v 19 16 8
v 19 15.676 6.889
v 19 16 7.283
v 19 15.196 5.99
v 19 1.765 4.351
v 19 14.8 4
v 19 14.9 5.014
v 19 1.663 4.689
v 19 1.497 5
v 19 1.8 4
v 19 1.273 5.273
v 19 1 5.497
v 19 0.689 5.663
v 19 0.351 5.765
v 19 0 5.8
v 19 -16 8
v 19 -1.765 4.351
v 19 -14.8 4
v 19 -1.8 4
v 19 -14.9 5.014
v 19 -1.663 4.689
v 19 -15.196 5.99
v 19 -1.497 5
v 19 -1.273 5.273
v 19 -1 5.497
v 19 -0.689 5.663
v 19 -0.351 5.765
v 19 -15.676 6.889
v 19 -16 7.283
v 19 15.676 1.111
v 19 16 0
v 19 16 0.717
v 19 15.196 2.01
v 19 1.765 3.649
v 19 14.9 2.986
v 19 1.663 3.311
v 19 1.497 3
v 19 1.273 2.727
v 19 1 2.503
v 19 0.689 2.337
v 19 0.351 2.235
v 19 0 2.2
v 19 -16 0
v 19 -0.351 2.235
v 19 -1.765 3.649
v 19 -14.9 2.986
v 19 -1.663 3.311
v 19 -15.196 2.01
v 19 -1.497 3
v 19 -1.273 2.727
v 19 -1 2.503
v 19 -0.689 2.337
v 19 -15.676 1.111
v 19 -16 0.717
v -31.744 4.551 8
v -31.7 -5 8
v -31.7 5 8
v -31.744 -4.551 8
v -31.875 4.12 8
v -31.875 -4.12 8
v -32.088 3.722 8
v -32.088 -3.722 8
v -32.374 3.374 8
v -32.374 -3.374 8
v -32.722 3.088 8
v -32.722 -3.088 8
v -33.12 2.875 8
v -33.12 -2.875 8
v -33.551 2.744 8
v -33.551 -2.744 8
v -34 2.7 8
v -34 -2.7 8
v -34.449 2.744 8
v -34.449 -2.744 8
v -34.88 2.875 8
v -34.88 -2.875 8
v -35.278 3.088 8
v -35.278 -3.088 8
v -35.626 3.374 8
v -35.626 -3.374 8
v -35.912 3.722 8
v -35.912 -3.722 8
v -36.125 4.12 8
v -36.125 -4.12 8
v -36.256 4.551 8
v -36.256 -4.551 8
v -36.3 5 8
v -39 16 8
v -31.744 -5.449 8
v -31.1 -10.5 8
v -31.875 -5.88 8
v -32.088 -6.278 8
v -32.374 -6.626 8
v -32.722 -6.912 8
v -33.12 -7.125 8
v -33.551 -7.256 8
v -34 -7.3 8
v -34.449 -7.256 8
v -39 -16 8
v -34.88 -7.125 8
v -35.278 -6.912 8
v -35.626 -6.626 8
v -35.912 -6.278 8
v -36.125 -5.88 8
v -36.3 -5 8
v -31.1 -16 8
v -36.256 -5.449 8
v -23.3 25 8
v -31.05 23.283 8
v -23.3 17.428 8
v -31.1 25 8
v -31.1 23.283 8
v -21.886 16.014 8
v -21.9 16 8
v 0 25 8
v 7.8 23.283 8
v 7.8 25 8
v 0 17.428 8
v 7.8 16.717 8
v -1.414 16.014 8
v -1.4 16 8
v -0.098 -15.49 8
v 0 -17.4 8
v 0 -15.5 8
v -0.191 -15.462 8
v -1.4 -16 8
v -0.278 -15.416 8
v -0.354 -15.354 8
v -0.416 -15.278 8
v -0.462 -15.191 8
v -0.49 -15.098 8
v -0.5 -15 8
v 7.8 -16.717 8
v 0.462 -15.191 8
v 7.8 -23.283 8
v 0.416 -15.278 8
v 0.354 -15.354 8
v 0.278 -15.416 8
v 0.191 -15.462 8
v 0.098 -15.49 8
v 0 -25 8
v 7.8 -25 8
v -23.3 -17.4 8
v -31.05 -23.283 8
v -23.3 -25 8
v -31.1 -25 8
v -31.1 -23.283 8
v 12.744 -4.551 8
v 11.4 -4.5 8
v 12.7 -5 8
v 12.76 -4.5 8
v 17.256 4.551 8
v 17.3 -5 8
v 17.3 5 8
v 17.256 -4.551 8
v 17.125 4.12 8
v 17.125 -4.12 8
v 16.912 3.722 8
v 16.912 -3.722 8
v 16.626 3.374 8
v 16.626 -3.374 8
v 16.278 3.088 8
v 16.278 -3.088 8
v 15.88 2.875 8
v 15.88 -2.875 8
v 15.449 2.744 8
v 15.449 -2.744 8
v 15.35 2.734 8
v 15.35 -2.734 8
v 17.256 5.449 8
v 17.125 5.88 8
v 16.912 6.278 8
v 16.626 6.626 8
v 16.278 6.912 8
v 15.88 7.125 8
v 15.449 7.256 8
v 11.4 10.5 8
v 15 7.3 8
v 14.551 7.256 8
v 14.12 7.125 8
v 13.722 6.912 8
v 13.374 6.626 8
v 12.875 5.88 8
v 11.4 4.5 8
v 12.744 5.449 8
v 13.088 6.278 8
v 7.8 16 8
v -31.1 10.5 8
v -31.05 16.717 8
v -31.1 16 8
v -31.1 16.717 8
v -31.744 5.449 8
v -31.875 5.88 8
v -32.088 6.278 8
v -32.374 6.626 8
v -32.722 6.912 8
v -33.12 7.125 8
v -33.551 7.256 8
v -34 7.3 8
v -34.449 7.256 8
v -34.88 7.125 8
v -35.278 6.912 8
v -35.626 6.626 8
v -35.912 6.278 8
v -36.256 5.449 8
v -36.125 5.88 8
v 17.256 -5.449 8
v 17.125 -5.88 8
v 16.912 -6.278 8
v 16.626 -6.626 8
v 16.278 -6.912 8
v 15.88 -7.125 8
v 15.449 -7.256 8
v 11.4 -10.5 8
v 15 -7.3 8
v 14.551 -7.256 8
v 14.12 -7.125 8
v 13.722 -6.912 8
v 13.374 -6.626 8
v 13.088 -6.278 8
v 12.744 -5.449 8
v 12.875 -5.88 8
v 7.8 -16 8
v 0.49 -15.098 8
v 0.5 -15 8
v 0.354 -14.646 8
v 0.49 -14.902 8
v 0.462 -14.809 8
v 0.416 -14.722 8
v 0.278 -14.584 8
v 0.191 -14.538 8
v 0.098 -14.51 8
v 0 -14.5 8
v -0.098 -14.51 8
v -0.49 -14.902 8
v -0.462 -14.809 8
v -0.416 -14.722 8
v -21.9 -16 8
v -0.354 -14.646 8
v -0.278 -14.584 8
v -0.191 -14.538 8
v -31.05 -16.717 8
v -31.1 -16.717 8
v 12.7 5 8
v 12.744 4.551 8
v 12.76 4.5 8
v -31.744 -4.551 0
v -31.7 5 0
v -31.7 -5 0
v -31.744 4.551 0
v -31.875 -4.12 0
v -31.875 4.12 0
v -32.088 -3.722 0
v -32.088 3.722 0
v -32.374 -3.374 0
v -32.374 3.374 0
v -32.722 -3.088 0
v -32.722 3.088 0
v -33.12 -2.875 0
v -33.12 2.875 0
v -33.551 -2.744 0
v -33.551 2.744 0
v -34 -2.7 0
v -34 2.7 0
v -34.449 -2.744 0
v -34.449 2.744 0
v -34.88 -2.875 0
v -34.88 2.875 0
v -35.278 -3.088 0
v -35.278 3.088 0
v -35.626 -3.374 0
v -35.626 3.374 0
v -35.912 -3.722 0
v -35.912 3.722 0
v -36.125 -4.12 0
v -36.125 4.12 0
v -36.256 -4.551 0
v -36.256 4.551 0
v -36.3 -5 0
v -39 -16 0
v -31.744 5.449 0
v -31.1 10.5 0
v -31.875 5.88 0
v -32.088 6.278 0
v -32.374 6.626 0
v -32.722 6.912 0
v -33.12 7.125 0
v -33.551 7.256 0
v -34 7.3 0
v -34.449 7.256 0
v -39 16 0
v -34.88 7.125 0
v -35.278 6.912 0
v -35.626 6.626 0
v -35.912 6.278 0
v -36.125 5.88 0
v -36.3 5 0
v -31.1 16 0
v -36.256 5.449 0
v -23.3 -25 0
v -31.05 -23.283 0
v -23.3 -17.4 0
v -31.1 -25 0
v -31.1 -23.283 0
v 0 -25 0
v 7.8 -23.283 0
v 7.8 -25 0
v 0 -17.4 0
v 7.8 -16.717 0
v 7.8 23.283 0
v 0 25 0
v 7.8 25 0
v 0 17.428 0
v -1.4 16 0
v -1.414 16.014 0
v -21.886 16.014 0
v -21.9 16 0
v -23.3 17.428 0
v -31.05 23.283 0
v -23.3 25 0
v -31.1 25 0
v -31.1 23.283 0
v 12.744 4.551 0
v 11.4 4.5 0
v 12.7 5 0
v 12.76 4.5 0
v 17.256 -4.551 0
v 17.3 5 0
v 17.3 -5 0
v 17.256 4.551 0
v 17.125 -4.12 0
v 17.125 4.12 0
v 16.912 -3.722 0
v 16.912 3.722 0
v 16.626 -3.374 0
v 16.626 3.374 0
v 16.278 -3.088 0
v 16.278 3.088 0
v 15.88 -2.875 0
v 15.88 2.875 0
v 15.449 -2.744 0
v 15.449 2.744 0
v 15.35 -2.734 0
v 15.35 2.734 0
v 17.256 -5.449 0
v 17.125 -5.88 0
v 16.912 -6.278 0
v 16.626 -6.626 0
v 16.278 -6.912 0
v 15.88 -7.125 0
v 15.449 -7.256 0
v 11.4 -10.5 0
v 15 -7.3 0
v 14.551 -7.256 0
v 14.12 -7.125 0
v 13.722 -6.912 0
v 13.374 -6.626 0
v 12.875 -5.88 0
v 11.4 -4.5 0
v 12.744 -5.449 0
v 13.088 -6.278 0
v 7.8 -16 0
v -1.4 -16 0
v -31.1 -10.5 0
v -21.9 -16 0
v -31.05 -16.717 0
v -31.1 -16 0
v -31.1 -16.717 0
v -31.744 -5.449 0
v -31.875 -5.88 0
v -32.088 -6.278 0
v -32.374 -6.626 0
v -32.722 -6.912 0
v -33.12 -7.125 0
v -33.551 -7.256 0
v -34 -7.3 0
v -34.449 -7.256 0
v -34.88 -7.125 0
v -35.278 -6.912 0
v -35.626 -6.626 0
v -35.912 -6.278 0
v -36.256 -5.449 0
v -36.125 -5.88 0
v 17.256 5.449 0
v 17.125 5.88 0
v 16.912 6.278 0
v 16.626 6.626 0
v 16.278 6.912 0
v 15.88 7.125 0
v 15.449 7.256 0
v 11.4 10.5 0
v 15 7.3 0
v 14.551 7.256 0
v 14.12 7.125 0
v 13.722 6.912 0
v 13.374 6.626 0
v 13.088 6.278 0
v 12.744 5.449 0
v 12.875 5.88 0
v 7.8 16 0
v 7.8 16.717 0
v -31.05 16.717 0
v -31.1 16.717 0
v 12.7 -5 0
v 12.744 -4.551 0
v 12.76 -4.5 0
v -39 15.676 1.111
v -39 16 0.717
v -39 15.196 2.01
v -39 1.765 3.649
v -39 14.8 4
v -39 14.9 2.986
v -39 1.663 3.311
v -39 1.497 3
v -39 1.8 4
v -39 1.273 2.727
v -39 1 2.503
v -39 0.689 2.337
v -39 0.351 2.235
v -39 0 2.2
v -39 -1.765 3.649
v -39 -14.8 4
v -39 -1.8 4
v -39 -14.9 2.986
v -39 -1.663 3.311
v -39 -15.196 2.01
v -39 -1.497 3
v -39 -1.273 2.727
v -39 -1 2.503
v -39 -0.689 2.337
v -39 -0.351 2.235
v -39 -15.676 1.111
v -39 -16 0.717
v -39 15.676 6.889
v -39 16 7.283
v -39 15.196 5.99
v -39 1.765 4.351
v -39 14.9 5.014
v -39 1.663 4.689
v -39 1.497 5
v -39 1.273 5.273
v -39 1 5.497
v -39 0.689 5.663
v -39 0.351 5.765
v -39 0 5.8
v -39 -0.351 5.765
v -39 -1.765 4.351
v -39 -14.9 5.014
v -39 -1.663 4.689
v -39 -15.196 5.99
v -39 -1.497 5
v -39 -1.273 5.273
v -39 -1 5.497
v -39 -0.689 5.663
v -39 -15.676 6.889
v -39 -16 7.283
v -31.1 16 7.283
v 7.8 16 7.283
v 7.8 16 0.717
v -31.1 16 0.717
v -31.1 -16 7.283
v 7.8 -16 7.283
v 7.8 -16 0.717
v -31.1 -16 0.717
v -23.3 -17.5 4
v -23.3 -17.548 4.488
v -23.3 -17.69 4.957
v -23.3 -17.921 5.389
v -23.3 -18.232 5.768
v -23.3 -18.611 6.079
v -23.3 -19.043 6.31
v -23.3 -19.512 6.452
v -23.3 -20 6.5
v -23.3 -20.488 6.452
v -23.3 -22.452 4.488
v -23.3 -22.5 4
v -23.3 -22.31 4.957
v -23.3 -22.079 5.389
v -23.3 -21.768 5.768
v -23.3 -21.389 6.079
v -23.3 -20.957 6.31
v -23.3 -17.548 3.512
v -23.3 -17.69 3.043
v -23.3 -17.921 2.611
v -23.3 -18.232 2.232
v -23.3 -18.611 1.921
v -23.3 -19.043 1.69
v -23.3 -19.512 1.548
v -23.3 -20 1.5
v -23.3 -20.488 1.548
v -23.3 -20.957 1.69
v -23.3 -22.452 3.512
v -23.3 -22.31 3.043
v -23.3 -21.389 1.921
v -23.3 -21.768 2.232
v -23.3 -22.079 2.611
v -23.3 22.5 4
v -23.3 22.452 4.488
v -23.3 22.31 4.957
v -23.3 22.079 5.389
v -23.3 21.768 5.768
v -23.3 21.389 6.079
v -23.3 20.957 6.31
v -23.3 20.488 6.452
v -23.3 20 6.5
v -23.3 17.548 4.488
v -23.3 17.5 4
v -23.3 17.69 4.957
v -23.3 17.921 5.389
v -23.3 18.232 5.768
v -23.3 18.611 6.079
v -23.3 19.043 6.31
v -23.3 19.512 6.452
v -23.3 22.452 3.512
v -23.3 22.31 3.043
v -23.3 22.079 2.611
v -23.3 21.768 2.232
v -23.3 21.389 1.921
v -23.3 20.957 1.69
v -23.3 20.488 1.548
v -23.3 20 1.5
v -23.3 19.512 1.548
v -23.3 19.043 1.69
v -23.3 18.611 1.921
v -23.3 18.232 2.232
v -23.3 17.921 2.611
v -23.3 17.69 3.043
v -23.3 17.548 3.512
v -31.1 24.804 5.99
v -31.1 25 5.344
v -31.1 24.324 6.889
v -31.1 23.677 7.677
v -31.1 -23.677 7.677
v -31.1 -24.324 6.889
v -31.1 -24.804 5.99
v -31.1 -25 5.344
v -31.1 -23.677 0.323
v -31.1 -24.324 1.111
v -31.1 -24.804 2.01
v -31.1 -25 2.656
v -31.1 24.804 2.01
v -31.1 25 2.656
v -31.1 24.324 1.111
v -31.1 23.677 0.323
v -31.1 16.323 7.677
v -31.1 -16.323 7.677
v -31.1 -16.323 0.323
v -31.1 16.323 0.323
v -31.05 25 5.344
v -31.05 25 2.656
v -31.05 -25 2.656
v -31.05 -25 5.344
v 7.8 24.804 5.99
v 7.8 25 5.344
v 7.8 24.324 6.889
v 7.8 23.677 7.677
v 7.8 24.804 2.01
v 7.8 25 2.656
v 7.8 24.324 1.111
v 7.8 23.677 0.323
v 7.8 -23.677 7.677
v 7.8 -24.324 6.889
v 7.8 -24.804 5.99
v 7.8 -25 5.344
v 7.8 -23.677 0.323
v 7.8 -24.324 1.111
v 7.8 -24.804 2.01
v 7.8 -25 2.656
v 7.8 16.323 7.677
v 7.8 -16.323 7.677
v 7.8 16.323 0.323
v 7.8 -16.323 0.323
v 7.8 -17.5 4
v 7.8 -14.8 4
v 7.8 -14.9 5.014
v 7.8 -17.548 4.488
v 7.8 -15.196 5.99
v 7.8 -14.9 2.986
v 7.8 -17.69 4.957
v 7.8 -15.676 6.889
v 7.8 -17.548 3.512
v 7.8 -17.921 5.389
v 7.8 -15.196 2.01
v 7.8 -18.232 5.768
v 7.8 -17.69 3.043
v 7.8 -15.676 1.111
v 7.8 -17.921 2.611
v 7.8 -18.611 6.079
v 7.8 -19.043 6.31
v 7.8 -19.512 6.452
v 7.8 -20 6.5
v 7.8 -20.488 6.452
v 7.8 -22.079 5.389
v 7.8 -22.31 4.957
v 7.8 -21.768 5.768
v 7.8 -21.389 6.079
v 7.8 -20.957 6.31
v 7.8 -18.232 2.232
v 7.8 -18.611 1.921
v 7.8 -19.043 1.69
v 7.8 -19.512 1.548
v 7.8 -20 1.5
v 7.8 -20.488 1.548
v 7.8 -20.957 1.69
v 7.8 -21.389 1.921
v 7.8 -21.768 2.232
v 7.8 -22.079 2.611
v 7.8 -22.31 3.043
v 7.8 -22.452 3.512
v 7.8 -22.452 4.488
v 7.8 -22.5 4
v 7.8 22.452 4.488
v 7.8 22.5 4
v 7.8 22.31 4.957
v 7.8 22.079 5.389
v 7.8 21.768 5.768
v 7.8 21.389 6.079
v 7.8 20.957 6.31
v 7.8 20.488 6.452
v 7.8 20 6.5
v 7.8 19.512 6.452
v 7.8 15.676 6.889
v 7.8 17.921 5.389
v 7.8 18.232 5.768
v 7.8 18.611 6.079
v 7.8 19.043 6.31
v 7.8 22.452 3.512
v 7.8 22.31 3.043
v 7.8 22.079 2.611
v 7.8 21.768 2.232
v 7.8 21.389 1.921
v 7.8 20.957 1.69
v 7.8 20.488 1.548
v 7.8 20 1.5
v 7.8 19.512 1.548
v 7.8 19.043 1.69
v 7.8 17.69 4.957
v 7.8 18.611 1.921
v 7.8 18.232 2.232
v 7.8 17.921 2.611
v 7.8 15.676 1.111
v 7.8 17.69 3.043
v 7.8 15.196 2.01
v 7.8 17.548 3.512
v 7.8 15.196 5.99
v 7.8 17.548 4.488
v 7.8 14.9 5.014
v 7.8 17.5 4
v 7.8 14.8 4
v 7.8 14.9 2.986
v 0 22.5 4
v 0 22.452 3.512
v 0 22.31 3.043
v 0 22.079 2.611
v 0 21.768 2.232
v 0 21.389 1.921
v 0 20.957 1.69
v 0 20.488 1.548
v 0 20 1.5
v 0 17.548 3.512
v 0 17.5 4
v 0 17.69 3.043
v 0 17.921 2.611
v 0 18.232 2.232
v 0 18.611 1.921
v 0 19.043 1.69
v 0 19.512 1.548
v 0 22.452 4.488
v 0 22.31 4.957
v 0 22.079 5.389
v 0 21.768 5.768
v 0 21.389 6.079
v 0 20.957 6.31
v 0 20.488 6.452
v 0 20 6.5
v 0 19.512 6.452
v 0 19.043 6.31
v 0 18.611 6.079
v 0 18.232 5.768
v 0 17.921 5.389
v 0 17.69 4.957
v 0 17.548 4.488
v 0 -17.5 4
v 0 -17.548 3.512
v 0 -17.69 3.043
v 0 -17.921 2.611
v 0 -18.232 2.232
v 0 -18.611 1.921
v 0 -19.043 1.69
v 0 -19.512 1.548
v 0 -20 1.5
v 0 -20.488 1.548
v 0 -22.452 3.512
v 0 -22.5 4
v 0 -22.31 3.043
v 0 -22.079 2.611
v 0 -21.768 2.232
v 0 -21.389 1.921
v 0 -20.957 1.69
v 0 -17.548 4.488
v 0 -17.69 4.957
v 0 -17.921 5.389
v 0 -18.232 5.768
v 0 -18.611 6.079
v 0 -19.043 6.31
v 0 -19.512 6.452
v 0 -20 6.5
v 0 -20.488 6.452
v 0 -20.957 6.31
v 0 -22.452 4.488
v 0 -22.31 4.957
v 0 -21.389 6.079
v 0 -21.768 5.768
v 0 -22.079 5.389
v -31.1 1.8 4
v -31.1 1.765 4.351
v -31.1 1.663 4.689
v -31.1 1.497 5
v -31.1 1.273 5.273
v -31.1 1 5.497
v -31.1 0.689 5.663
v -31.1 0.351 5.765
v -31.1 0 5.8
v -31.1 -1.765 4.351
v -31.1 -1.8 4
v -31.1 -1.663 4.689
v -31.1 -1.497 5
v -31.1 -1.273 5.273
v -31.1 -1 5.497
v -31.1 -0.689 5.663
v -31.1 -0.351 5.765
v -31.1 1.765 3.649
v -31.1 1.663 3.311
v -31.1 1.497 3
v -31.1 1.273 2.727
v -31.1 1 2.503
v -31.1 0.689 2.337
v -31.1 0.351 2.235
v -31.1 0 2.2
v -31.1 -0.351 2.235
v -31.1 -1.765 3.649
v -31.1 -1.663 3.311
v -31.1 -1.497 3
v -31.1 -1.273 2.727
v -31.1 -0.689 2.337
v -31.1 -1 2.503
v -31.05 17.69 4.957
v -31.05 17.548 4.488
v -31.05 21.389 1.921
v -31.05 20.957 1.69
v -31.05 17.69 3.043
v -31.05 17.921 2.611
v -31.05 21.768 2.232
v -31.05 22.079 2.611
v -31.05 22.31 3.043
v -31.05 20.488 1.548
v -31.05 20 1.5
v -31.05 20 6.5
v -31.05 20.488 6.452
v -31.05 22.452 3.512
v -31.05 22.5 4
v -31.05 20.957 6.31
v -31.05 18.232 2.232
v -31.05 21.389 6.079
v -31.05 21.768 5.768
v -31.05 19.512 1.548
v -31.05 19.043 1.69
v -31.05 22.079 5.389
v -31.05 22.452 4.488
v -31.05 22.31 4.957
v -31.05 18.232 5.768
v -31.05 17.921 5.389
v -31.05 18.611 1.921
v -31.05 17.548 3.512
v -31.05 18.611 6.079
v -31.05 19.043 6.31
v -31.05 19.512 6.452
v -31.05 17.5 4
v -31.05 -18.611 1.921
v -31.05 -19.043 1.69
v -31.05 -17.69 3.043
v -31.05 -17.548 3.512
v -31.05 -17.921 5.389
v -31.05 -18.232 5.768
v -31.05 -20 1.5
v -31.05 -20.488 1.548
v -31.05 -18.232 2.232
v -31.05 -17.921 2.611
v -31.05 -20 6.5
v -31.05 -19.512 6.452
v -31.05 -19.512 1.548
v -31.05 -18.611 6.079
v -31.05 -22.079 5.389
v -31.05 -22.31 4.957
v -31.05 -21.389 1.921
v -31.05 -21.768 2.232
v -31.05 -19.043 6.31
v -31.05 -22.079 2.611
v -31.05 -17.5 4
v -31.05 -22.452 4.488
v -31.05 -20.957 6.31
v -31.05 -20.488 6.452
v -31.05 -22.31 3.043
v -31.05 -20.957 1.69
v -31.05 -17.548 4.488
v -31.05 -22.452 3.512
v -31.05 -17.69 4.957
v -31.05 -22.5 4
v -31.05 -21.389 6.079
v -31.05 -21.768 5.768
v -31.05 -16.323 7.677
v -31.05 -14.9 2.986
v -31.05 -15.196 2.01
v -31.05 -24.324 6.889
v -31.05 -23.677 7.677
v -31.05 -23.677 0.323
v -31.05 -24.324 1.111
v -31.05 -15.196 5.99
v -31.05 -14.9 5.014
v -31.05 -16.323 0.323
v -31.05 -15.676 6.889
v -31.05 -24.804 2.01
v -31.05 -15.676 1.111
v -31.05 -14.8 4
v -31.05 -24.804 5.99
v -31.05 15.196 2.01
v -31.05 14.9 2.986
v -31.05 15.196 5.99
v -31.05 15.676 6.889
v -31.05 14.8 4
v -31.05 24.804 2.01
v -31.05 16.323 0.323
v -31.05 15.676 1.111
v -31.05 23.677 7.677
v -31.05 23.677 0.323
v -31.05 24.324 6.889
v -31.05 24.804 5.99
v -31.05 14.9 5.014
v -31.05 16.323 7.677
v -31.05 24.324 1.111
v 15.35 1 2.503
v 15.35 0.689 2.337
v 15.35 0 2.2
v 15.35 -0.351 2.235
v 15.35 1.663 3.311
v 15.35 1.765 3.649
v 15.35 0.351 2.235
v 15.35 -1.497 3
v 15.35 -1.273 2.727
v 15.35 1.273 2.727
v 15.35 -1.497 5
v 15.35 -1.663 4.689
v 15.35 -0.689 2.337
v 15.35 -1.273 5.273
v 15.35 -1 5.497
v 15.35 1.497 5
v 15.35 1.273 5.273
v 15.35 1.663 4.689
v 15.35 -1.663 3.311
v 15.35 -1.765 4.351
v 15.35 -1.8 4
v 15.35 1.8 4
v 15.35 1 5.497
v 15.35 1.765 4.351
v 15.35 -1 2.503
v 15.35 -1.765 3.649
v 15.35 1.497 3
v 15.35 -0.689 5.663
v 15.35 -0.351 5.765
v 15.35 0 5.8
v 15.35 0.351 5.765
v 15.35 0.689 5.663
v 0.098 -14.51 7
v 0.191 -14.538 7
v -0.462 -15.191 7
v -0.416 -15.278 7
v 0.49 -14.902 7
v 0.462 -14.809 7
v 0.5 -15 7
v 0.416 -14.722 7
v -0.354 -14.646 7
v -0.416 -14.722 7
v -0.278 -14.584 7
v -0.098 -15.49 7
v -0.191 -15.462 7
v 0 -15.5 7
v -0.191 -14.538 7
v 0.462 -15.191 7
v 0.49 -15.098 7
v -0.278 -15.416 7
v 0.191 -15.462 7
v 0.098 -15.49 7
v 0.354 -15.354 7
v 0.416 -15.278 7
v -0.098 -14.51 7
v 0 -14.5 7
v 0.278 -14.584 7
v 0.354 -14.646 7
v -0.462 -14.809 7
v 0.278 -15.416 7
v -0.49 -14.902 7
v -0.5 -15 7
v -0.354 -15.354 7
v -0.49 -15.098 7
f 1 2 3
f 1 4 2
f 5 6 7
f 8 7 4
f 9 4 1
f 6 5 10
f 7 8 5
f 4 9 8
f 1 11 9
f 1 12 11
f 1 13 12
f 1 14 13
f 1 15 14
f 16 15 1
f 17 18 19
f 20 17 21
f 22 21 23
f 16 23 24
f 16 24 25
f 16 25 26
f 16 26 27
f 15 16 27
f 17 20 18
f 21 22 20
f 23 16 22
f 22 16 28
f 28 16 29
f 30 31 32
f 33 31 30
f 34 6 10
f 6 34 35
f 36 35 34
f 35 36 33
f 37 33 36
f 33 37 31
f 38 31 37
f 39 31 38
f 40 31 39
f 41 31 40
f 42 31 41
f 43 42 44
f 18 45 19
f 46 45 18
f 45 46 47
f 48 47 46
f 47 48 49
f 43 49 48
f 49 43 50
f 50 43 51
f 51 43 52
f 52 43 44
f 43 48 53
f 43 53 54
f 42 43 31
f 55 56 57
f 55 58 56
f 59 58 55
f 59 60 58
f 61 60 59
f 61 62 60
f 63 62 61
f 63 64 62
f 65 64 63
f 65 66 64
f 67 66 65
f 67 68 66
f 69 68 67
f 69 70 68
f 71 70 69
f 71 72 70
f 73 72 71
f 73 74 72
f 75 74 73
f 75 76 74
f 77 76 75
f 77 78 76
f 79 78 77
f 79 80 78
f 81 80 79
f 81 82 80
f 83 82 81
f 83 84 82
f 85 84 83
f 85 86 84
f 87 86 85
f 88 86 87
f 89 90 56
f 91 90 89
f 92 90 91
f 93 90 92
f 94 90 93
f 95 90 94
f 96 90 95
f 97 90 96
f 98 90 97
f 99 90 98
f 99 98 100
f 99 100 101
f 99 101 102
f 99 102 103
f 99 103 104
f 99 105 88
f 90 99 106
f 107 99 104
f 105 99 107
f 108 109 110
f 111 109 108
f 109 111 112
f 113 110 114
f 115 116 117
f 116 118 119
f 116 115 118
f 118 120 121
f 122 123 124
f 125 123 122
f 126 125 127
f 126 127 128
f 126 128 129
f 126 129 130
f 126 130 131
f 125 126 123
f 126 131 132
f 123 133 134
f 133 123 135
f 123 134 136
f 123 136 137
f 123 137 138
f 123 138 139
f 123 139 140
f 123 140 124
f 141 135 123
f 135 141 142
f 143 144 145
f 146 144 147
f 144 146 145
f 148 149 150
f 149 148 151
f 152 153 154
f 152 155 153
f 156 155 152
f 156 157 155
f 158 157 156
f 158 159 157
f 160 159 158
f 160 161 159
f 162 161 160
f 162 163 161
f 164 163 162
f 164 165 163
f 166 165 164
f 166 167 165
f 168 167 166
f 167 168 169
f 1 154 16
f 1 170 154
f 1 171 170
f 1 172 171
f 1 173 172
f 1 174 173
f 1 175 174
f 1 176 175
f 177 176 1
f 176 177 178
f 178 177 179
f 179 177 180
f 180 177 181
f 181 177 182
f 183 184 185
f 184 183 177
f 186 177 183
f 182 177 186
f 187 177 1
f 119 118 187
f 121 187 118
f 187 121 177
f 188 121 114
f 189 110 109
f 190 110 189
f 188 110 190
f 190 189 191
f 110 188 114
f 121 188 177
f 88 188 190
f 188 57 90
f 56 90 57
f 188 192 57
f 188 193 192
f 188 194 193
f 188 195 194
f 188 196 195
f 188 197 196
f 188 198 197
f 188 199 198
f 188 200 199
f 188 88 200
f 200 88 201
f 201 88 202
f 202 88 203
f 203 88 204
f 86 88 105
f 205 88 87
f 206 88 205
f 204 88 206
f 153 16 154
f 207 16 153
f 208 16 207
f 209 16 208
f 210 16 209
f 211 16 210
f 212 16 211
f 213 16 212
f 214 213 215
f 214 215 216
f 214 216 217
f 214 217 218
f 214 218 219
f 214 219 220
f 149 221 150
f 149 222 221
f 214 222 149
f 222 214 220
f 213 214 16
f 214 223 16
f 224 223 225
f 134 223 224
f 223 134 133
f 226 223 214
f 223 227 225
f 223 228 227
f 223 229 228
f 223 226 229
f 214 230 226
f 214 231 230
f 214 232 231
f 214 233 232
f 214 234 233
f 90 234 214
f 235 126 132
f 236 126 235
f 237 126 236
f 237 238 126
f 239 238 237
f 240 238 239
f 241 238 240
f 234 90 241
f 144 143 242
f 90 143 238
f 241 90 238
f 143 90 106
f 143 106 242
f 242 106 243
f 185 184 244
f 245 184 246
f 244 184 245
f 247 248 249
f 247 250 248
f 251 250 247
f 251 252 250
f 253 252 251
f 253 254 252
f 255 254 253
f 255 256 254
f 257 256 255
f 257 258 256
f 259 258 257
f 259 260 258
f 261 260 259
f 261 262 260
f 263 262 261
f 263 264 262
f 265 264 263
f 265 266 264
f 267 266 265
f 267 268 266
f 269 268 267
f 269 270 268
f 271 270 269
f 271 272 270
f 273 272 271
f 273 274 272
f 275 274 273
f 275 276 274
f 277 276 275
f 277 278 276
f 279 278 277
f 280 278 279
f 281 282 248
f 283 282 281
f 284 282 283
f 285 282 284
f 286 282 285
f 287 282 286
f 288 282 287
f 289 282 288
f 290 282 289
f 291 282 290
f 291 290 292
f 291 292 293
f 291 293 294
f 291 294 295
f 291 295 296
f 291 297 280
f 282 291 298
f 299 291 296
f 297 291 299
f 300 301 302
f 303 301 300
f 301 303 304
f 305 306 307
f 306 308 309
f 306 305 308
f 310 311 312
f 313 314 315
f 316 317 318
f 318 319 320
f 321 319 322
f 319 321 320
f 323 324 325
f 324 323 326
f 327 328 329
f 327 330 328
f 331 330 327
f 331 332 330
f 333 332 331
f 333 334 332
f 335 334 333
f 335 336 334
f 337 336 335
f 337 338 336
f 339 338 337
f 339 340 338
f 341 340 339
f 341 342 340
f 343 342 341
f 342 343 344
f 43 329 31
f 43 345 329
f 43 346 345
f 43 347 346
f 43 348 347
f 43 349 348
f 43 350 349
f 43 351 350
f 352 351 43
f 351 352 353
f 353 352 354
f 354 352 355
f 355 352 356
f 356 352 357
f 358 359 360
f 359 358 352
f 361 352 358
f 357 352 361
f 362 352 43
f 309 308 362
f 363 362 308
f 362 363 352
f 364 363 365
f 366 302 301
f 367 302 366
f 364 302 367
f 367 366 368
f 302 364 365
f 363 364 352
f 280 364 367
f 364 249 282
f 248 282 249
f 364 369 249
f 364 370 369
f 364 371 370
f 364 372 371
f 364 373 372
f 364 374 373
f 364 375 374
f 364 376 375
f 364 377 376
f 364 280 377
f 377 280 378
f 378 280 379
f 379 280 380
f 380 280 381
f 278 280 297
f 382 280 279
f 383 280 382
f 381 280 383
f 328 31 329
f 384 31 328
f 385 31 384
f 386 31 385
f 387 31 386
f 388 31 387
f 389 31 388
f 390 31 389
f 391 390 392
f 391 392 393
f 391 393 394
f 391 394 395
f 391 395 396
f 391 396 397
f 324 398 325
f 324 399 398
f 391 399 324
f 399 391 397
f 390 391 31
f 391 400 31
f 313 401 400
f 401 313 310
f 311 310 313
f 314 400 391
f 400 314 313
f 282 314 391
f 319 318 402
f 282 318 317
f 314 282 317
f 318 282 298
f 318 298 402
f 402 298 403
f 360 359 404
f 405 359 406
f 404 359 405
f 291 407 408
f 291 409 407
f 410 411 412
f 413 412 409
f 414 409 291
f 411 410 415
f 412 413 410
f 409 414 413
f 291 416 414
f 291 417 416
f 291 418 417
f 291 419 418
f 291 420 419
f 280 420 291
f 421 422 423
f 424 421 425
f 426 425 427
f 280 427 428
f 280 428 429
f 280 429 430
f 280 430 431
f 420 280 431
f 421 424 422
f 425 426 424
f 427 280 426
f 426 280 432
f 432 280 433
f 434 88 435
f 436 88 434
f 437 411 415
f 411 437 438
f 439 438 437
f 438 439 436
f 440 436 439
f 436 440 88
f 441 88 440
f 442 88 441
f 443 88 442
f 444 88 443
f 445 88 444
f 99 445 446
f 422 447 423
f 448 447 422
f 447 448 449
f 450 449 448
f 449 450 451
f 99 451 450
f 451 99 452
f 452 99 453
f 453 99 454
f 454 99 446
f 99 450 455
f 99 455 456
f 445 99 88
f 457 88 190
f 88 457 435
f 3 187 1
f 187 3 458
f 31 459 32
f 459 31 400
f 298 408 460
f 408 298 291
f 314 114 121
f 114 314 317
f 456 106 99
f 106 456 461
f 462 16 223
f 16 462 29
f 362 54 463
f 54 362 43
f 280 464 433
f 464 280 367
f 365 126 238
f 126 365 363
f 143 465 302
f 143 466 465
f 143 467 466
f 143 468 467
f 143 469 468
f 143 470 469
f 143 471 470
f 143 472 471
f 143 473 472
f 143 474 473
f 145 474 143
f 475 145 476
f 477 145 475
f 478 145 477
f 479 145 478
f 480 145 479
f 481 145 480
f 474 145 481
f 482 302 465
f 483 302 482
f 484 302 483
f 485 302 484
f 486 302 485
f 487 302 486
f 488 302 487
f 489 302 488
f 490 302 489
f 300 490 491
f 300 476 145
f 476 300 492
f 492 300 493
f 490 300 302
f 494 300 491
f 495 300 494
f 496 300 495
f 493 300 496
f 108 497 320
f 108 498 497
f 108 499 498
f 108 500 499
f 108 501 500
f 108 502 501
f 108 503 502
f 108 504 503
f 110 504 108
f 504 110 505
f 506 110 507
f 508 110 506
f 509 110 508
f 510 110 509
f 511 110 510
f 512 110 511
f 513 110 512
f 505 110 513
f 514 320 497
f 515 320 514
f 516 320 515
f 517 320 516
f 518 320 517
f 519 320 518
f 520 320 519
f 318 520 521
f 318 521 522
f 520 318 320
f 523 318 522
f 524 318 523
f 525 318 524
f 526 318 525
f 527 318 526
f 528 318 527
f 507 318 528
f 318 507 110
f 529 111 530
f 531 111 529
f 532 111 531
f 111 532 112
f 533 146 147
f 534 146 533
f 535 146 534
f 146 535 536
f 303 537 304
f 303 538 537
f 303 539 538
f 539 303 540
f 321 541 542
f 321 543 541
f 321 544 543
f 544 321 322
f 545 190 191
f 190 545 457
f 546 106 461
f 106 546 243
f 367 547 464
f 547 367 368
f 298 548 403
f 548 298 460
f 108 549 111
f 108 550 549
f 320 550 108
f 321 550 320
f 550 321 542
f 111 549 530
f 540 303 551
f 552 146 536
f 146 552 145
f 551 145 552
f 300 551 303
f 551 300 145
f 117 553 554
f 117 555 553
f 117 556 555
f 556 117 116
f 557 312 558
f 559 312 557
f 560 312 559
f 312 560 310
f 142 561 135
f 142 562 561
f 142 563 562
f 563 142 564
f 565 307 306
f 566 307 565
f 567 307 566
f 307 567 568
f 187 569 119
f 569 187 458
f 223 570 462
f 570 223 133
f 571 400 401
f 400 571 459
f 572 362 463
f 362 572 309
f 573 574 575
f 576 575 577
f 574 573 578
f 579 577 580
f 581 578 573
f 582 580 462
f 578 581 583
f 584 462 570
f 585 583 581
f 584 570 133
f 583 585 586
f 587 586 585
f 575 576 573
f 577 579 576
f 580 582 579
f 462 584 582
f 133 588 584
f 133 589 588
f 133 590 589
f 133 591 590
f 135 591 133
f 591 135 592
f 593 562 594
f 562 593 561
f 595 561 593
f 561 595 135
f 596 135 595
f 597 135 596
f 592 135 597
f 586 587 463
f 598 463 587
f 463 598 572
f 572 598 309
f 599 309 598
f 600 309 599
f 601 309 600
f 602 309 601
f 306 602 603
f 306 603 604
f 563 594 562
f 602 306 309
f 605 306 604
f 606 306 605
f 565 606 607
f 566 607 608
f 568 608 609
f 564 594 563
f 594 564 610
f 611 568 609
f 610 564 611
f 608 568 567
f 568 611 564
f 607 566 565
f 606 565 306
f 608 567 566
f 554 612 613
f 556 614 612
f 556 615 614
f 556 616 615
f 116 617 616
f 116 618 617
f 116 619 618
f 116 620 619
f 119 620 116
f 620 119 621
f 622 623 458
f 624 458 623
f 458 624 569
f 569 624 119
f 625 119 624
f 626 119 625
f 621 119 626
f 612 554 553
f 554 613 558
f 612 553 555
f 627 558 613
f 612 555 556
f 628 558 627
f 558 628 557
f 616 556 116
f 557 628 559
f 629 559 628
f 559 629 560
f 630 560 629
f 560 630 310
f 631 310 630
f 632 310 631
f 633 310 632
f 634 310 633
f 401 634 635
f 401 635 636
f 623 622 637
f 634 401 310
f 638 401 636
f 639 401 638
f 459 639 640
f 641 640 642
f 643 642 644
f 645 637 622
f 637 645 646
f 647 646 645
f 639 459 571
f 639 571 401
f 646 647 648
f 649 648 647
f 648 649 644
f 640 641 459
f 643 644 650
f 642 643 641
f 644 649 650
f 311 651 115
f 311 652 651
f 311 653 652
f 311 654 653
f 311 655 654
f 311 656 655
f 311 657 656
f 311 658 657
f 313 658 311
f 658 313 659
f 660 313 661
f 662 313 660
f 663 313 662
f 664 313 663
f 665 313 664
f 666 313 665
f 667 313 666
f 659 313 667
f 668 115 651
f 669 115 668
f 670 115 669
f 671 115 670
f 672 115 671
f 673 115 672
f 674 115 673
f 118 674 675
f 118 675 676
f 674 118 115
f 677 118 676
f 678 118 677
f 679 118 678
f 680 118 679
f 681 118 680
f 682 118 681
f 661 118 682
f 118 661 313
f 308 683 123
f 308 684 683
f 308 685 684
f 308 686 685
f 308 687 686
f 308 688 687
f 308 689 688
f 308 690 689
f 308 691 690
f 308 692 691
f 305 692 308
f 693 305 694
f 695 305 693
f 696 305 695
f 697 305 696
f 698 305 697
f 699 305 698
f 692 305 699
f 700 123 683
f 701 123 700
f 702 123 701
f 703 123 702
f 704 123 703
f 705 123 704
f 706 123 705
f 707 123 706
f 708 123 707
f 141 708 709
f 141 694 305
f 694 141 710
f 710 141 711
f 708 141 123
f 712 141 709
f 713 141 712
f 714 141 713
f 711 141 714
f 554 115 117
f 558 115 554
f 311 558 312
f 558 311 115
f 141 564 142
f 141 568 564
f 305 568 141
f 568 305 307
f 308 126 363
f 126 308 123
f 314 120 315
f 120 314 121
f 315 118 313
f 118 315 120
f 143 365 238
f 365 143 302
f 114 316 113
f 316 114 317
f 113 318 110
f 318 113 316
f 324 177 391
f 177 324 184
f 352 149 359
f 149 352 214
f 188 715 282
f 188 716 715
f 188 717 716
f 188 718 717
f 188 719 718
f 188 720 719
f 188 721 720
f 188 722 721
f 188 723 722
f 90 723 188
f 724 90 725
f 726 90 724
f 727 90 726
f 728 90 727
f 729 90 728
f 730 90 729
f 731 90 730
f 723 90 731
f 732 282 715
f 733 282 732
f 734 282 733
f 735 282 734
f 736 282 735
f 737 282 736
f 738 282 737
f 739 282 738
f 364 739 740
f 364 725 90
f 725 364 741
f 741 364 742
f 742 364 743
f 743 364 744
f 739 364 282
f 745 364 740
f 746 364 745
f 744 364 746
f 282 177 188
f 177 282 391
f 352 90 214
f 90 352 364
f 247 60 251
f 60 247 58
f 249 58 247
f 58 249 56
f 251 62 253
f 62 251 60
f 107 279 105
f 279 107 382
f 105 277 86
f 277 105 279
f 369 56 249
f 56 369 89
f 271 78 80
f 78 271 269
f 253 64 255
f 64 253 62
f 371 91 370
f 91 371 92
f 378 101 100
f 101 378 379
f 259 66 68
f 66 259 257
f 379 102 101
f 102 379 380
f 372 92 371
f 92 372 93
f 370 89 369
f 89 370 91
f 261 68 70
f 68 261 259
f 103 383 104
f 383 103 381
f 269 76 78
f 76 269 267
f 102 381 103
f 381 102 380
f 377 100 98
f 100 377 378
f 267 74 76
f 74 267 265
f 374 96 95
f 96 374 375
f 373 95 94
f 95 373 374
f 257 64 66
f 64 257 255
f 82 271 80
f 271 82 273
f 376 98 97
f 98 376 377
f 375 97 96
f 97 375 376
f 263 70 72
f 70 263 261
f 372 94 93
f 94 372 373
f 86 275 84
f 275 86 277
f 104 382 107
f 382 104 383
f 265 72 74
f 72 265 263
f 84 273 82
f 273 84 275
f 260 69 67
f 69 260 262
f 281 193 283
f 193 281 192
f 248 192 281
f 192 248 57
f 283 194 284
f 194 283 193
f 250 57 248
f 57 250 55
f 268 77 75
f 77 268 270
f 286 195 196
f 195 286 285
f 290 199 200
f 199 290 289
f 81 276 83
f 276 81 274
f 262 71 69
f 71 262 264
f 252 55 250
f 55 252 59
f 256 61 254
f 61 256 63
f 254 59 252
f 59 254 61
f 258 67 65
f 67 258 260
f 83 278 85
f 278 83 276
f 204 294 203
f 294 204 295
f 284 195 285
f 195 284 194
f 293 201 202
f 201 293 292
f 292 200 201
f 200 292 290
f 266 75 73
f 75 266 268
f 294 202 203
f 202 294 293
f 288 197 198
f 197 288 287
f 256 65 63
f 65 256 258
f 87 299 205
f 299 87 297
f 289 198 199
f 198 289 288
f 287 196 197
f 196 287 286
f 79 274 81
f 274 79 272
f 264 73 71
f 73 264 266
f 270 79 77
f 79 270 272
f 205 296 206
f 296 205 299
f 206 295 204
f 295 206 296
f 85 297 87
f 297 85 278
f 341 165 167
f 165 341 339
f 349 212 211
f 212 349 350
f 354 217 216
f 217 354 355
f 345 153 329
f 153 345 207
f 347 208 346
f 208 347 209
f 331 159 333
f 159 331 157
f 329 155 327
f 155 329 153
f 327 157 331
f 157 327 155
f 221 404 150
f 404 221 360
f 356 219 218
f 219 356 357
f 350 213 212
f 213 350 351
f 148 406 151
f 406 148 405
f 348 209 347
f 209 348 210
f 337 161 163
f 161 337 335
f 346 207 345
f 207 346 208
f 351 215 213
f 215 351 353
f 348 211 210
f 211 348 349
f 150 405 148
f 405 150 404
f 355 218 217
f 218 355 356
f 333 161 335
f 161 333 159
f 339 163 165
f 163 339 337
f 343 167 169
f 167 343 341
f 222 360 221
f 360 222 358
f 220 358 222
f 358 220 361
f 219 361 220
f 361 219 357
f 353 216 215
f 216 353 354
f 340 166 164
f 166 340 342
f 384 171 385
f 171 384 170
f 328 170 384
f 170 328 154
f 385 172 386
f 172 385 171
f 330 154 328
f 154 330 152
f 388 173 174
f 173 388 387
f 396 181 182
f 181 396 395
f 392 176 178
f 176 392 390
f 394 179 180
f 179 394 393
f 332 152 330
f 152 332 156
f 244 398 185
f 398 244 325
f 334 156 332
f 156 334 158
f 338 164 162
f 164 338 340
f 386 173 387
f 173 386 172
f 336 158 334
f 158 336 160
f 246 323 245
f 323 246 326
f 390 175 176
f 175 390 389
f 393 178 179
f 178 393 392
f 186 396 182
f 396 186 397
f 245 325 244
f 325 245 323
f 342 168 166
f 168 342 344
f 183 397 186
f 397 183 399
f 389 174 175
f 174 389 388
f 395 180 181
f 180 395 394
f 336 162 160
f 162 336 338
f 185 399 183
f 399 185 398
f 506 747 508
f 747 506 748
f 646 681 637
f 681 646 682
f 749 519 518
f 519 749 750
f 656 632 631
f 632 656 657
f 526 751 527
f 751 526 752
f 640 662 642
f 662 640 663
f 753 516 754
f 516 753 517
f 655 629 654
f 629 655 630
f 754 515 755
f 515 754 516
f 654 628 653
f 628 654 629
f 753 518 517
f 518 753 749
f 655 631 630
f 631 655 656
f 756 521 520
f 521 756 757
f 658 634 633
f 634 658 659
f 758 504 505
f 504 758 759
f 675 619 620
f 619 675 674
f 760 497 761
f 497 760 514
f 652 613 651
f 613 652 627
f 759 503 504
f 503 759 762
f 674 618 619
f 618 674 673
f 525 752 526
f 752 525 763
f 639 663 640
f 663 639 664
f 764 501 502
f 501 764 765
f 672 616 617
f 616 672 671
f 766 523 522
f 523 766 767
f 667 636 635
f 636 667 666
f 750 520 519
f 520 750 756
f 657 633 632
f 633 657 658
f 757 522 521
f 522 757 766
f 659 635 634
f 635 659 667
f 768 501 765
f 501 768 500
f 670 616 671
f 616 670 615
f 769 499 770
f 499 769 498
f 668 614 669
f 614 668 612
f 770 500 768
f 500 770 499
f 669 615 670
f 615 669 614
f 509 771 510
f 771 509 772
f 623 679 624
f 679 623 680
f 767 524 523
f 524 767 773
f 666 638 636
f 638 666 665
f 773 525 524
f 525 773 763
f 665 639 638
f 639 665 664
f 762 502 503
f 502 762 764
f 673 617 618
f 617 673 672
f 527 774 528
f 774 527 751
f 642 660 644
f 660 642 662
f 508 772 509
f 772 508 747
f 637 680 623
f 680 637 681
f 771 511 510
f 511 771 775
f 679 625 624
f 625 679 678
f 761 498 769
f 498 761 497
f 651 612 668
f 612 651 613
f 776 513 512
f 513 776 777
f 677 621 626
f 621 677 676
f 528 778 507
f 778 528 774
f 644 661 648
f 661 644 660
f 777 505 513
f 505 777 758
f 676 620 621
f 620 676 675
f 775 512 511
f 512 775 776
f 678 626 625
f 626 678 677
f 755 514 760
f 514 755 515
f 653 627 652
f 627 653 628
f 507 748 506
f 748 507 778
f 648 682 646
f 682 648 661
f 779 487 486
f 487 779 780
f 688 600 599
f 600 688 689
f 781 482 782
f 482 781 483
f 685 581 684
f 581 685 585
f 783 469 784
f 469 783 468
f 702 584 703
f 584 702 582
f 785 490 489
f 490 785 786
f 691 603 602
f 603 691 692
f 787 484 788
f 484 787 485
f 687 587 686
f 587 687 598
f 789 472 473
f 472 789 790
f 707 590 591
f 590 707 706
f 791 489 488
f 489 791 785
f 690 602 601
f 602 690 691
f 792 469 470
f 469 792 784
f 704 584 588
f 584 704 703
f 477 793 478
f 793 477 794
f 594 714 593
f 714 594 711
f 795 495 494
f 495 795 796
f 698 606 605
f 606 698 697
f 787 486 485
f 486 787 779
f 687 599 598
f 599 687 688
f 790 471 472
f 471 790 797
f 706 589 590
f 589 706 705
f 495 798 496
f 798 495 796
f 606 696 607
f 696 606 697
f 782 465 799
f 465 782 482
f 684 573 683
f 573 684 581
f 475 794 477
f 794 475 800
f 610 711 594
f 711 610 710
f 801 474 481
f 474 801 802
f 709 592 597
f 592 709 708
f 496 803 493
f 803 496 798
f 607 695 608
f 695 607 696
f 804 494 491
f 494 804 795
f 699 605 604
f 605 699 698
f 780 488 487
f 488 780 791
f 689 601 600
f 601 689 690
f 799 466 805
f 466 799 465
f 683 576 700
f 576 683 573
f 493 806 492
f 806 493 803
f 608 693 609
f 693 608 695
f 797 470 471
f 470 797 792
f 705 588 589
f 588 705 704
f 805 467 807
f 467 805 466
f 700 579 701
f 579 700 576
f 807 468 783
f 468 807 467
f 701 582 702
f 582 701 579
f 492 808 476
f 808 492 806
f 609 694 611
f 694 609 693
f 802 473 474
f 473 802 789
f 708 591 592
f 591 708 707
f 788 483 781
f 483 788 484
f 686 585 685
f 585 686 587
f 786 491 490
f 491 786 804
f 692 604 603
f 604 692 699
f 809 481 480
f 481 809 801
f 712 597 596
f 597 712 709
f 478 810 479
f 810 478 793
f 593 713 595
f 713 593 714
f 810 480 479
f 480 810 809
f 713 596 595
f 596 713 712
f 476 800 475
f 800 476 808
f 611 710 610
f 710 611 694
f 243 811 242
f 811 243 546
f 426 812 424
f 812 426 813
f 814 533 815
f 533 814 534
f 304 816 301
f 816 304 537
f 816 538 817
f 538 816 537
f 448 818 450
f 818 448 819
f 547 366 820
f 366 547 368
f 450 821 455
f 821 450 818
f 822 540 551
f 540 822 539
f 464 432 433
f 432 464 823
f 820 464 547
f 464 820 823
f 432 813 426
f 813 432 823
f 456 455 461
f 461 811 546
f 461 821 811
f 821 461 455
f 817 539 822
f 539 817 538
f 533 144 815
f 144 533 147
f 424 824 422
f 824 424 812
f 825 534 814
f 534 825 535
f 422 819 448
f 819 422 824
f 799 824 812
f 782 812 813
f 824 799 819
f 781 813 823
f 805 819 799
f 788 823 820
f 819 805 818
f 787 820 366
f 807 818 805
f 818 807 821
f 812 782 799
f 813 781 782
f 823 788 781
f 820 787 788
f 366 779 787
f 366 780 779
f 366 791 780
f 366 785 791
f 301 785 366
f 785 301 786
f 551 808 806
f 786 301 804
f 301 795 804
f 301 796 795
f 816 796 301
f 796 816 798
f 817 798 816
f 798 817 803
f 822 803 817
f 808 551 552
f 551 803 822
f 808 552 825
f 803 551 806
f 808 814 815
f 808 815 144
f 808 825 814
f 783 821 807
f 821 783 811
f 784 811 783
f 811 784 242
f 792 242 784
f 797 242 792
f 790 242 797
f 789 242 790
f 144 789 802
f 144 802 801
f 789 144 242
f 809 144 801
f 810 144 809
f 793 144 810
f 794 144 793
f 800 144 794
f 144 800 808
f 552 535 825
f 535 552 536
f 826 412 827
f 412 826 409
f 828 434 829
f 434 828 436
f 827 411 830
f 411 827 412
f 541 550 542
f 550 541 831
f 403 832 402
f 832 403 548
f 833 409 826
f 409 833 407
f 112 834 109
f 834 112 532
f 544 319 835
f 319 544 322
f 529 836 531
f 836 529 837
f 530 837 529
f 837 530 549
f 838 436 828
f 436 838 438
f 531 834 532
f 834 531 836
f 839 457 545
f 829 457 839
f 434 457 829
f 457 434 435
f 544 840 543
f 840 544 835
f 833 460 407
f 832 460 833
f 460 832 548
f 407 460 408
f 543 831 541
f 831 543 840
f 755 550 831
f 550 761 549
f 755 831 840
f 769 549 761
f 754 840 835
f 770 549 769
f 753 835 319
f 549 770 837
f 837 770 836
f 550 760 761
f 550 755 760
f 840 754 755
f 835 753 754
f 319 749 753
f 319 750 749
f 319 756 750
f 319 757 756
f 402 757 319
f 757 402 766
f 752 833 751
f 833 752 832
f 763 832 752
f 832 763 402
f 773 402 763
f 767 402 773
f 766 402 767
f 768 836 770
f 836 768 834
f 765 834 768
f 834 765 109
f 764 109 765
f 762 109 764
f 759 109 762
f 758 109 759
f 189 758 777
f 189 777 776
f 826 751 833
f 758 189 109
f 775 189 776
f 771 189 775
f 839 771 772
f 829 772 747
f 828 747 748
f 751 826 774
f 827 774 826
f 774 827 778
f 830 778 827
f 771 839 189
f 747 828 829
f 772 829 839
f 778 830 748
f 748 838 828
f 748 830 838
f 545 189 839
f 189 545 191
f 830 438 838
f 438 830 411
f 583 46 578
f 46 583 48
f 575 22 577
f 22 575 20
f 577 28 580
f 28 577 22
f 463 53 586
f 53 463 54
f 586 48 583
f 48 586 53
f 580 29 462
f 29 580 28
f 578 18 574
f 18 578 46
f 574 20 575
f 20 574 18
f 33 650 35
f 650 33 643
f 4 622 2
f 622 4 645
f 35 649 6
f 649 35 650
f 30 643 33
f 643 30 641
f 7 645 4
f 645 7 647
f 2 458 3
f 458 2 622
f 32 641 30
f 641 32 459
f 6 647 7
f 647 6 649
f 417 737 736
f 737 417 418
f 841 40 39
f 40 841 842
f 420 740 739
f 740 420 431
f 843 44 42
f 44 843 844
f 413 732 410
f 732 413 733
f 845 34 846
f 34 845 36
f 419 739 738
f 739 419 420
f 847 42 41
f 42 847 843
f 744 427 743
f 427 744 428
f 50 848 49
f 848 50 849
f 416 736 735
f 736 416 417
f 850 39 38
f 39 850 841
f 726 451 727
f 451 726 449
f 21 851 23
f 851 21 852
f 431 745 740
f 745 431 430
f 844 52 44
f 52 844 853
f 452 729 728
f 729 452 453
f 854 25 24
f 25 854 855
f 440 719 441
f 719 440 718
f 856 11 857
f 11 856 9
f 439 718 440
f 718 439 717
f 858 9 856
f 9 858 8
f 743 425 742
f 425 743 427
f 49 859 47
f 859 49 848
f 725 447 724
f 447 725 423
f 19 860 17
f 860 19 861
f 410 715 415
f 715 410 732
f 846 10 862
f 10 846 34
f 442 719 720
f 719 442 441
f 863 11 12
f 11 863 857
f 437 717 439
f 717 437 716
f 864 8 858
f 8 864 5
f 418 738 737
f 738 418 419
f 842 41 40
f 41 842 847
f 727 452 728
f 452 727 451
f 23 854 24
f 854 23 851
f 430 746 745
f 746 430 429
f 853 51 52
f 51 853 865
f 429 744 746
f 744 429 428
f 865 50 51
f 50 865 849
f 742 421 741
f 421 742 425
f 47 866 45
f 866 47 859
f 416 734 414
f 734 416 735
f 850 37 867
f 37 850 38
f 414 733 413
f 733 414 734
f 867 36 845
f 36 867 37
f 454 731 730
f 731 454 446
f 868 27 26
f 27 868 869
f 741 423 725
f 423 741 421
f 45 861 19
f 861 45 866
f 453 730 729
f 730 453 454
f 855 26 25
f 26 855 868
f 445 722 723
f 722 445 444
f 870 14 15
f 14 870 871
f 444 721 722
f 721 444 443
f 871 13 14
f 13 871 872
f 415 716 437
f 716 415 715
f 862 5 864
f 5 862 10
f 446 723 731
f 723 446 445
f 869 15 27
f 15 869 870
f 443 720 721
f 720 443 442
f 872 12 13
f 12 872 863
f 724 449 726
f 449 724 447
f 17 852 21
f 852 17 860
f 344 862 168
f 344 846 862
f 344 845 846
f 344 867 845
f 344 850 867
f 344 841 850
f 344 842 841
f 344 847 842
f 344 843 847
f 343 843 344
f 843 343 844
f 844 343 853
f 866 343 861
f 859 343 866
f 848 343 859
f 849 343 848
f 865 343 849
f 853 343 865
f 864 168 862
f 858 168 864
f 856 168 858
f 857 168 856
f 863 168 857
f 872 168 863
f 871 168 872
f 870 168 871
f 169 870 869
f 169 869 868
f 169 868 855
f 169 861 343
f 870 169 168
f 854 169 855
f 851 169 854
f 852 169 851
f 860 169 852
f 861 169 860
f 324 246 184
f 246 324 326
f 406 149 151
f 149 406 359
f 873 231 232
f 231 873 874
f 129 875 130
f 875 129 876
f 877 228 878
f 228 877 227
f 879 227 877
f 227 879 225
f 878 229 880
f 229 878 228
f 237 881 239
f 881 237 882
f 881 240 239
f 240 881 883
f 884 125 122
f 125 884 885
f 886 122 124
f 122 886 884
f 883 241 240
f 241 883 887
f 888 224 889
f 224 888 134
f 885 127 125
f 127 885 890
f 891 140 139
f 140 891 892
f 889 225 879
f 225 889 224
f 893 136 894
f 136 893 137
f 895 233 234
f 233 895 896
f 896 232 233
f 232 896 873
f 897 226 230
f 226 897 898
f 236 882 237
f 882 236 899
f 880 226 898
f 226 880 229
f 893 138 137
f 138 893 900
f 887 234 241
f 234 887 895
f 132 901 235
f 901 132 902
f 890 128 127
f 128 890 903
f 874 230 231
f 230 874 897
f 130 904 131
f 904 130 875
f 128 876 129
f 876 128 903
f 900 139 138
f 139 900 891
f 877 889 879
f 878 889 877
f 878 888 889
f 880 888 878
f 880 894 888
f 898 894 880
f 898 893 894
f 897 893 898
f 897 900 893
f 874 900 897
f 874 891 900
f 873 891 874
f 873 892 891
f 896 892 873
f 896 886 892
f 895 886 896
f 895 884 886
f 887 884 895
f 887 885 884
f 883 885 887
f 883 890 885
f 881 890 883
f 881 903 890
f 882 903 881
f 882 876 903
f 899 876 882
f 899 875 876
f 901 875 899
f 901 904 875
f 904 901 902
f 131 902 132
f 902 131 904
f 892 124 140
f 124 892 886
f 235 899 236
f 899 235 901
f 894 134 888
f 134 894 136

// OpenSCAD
$fn = 32;
h  = 8.0; // like lego
hm = h+0.1; // for better holes

r1 = 2.5;
r2 = 2.3;

// X
L0L = 39.0;  L0R = 19.0; L0 = L0L + L0R; // outer
L1L = 37.6;  L1R = 17.9; L1 = L1L + L1R; // servo dimensions - unused
L2L = 34.0;  L2R = 15.0; L2 = L2L + L2R; // mounting holes
L3L = 31.1;  L3R = 11.4; L3 = L3L + L3R; // inner hole
Lm = 7.8; // mounting extra

//
W1 = 21.0; W1_2 = W1 / 2; // inner
W2 = 32.0; W2_2 = W2 / 2; // outer
W3 = 50.0; W3_2 = W3 / 2; // mounting

// translate([]) cube([]);

// #cylinder( r=0.2, h = 1.5*h );
//#translate([ 0,  20.0, 0]) cylinder( r=0.2, h = 1.5*h );
//#translate([ 0, -20.0, 0]) cylinder( r=0.2, h = 1.5*h );

difference() {
  union() {
    translate([-L0L,-W2_2,0]) cube([L0,W2,h]);
    translate([-L3L,-W3_2,0]) cube([Lm,W3,h]);
    translate([   0,-W3_2,0]) cube([Lm,W3,h]);
    translate([   0, -W2_2-1.4, 0]) rotate([0,0,45]) cube([2,2,h]);
    translate([   0,  W2_2-1.4, 0]) rotate([0,0,45]) cube([2,2,h]);
    translate([ -L3L+Lm, -W2_2-1.4, 0]) rotate([0,0,45]) cube([2,2,h]);
    translate([ -L3L+Lm,  W2_2-1.4, 0]) rotate([0,0,45]) cube([2,2,h]);
  }
  translate([-L3L,-W1_2,-0.05]) cube([L3,W1,hm]);
  translate([-L2L,-5.0,-0.05]) cylinder( r=r2, h=hm );
  translate([-L2L, 5.0,-0.05]) cylinder( r=r2, h=hm );
  translate([ L2R,-5.0,-0.05]) cylinder( r=r2, h=hm );
  translate([ L2R, 5.0,-0.05]) cylinder( r=r2, h=hm );
  translate([ -L0L, 20.0, h/2]) rotate([0,90,0]) cylinder( r=r1, h=L0 );
  translate([ -L0L,-20.0, h/2]) rotate([0,90,0]) cylinder( r=r1, h=L0 );
  // space for nuts
  translate([ -L0L-0.05,-20.0, h/2]) rotate([0,90,0]) cylinder( r=5.2, h=8.0 );
  translate([ -L0L-0.05, 20.0, h/2]) rotate([0,90,0]) cylinder( r=5.2, h=8.0 );
  translate([        Lm,-20.0, h/2]) rotate([0,90,0]) cylinder( r=5.2, h=12.0 );
  translate([        Lm, 20.0, h/2]) rotate([0,90,0]) cylinder( r=5.2, h=12.0 );
  // long central hole
  translate([ -L0L-0.05,  0.0, h/2]) rotate([0,90,0]) cylinder( r=1.8, h=L0+0.1 );
  // hole for wires durind mouting
  //translate([ L3R-2,-0, -0.05]) cylinder( r=5.5, h=hm );
  translate([ L3R-0.05, -4.5, -0.05]) cube( [4,9,hm] );
  // indicator
  translate([ 0,-15, h-1]) cylinder( r=0.5, h=2 );
  
}
